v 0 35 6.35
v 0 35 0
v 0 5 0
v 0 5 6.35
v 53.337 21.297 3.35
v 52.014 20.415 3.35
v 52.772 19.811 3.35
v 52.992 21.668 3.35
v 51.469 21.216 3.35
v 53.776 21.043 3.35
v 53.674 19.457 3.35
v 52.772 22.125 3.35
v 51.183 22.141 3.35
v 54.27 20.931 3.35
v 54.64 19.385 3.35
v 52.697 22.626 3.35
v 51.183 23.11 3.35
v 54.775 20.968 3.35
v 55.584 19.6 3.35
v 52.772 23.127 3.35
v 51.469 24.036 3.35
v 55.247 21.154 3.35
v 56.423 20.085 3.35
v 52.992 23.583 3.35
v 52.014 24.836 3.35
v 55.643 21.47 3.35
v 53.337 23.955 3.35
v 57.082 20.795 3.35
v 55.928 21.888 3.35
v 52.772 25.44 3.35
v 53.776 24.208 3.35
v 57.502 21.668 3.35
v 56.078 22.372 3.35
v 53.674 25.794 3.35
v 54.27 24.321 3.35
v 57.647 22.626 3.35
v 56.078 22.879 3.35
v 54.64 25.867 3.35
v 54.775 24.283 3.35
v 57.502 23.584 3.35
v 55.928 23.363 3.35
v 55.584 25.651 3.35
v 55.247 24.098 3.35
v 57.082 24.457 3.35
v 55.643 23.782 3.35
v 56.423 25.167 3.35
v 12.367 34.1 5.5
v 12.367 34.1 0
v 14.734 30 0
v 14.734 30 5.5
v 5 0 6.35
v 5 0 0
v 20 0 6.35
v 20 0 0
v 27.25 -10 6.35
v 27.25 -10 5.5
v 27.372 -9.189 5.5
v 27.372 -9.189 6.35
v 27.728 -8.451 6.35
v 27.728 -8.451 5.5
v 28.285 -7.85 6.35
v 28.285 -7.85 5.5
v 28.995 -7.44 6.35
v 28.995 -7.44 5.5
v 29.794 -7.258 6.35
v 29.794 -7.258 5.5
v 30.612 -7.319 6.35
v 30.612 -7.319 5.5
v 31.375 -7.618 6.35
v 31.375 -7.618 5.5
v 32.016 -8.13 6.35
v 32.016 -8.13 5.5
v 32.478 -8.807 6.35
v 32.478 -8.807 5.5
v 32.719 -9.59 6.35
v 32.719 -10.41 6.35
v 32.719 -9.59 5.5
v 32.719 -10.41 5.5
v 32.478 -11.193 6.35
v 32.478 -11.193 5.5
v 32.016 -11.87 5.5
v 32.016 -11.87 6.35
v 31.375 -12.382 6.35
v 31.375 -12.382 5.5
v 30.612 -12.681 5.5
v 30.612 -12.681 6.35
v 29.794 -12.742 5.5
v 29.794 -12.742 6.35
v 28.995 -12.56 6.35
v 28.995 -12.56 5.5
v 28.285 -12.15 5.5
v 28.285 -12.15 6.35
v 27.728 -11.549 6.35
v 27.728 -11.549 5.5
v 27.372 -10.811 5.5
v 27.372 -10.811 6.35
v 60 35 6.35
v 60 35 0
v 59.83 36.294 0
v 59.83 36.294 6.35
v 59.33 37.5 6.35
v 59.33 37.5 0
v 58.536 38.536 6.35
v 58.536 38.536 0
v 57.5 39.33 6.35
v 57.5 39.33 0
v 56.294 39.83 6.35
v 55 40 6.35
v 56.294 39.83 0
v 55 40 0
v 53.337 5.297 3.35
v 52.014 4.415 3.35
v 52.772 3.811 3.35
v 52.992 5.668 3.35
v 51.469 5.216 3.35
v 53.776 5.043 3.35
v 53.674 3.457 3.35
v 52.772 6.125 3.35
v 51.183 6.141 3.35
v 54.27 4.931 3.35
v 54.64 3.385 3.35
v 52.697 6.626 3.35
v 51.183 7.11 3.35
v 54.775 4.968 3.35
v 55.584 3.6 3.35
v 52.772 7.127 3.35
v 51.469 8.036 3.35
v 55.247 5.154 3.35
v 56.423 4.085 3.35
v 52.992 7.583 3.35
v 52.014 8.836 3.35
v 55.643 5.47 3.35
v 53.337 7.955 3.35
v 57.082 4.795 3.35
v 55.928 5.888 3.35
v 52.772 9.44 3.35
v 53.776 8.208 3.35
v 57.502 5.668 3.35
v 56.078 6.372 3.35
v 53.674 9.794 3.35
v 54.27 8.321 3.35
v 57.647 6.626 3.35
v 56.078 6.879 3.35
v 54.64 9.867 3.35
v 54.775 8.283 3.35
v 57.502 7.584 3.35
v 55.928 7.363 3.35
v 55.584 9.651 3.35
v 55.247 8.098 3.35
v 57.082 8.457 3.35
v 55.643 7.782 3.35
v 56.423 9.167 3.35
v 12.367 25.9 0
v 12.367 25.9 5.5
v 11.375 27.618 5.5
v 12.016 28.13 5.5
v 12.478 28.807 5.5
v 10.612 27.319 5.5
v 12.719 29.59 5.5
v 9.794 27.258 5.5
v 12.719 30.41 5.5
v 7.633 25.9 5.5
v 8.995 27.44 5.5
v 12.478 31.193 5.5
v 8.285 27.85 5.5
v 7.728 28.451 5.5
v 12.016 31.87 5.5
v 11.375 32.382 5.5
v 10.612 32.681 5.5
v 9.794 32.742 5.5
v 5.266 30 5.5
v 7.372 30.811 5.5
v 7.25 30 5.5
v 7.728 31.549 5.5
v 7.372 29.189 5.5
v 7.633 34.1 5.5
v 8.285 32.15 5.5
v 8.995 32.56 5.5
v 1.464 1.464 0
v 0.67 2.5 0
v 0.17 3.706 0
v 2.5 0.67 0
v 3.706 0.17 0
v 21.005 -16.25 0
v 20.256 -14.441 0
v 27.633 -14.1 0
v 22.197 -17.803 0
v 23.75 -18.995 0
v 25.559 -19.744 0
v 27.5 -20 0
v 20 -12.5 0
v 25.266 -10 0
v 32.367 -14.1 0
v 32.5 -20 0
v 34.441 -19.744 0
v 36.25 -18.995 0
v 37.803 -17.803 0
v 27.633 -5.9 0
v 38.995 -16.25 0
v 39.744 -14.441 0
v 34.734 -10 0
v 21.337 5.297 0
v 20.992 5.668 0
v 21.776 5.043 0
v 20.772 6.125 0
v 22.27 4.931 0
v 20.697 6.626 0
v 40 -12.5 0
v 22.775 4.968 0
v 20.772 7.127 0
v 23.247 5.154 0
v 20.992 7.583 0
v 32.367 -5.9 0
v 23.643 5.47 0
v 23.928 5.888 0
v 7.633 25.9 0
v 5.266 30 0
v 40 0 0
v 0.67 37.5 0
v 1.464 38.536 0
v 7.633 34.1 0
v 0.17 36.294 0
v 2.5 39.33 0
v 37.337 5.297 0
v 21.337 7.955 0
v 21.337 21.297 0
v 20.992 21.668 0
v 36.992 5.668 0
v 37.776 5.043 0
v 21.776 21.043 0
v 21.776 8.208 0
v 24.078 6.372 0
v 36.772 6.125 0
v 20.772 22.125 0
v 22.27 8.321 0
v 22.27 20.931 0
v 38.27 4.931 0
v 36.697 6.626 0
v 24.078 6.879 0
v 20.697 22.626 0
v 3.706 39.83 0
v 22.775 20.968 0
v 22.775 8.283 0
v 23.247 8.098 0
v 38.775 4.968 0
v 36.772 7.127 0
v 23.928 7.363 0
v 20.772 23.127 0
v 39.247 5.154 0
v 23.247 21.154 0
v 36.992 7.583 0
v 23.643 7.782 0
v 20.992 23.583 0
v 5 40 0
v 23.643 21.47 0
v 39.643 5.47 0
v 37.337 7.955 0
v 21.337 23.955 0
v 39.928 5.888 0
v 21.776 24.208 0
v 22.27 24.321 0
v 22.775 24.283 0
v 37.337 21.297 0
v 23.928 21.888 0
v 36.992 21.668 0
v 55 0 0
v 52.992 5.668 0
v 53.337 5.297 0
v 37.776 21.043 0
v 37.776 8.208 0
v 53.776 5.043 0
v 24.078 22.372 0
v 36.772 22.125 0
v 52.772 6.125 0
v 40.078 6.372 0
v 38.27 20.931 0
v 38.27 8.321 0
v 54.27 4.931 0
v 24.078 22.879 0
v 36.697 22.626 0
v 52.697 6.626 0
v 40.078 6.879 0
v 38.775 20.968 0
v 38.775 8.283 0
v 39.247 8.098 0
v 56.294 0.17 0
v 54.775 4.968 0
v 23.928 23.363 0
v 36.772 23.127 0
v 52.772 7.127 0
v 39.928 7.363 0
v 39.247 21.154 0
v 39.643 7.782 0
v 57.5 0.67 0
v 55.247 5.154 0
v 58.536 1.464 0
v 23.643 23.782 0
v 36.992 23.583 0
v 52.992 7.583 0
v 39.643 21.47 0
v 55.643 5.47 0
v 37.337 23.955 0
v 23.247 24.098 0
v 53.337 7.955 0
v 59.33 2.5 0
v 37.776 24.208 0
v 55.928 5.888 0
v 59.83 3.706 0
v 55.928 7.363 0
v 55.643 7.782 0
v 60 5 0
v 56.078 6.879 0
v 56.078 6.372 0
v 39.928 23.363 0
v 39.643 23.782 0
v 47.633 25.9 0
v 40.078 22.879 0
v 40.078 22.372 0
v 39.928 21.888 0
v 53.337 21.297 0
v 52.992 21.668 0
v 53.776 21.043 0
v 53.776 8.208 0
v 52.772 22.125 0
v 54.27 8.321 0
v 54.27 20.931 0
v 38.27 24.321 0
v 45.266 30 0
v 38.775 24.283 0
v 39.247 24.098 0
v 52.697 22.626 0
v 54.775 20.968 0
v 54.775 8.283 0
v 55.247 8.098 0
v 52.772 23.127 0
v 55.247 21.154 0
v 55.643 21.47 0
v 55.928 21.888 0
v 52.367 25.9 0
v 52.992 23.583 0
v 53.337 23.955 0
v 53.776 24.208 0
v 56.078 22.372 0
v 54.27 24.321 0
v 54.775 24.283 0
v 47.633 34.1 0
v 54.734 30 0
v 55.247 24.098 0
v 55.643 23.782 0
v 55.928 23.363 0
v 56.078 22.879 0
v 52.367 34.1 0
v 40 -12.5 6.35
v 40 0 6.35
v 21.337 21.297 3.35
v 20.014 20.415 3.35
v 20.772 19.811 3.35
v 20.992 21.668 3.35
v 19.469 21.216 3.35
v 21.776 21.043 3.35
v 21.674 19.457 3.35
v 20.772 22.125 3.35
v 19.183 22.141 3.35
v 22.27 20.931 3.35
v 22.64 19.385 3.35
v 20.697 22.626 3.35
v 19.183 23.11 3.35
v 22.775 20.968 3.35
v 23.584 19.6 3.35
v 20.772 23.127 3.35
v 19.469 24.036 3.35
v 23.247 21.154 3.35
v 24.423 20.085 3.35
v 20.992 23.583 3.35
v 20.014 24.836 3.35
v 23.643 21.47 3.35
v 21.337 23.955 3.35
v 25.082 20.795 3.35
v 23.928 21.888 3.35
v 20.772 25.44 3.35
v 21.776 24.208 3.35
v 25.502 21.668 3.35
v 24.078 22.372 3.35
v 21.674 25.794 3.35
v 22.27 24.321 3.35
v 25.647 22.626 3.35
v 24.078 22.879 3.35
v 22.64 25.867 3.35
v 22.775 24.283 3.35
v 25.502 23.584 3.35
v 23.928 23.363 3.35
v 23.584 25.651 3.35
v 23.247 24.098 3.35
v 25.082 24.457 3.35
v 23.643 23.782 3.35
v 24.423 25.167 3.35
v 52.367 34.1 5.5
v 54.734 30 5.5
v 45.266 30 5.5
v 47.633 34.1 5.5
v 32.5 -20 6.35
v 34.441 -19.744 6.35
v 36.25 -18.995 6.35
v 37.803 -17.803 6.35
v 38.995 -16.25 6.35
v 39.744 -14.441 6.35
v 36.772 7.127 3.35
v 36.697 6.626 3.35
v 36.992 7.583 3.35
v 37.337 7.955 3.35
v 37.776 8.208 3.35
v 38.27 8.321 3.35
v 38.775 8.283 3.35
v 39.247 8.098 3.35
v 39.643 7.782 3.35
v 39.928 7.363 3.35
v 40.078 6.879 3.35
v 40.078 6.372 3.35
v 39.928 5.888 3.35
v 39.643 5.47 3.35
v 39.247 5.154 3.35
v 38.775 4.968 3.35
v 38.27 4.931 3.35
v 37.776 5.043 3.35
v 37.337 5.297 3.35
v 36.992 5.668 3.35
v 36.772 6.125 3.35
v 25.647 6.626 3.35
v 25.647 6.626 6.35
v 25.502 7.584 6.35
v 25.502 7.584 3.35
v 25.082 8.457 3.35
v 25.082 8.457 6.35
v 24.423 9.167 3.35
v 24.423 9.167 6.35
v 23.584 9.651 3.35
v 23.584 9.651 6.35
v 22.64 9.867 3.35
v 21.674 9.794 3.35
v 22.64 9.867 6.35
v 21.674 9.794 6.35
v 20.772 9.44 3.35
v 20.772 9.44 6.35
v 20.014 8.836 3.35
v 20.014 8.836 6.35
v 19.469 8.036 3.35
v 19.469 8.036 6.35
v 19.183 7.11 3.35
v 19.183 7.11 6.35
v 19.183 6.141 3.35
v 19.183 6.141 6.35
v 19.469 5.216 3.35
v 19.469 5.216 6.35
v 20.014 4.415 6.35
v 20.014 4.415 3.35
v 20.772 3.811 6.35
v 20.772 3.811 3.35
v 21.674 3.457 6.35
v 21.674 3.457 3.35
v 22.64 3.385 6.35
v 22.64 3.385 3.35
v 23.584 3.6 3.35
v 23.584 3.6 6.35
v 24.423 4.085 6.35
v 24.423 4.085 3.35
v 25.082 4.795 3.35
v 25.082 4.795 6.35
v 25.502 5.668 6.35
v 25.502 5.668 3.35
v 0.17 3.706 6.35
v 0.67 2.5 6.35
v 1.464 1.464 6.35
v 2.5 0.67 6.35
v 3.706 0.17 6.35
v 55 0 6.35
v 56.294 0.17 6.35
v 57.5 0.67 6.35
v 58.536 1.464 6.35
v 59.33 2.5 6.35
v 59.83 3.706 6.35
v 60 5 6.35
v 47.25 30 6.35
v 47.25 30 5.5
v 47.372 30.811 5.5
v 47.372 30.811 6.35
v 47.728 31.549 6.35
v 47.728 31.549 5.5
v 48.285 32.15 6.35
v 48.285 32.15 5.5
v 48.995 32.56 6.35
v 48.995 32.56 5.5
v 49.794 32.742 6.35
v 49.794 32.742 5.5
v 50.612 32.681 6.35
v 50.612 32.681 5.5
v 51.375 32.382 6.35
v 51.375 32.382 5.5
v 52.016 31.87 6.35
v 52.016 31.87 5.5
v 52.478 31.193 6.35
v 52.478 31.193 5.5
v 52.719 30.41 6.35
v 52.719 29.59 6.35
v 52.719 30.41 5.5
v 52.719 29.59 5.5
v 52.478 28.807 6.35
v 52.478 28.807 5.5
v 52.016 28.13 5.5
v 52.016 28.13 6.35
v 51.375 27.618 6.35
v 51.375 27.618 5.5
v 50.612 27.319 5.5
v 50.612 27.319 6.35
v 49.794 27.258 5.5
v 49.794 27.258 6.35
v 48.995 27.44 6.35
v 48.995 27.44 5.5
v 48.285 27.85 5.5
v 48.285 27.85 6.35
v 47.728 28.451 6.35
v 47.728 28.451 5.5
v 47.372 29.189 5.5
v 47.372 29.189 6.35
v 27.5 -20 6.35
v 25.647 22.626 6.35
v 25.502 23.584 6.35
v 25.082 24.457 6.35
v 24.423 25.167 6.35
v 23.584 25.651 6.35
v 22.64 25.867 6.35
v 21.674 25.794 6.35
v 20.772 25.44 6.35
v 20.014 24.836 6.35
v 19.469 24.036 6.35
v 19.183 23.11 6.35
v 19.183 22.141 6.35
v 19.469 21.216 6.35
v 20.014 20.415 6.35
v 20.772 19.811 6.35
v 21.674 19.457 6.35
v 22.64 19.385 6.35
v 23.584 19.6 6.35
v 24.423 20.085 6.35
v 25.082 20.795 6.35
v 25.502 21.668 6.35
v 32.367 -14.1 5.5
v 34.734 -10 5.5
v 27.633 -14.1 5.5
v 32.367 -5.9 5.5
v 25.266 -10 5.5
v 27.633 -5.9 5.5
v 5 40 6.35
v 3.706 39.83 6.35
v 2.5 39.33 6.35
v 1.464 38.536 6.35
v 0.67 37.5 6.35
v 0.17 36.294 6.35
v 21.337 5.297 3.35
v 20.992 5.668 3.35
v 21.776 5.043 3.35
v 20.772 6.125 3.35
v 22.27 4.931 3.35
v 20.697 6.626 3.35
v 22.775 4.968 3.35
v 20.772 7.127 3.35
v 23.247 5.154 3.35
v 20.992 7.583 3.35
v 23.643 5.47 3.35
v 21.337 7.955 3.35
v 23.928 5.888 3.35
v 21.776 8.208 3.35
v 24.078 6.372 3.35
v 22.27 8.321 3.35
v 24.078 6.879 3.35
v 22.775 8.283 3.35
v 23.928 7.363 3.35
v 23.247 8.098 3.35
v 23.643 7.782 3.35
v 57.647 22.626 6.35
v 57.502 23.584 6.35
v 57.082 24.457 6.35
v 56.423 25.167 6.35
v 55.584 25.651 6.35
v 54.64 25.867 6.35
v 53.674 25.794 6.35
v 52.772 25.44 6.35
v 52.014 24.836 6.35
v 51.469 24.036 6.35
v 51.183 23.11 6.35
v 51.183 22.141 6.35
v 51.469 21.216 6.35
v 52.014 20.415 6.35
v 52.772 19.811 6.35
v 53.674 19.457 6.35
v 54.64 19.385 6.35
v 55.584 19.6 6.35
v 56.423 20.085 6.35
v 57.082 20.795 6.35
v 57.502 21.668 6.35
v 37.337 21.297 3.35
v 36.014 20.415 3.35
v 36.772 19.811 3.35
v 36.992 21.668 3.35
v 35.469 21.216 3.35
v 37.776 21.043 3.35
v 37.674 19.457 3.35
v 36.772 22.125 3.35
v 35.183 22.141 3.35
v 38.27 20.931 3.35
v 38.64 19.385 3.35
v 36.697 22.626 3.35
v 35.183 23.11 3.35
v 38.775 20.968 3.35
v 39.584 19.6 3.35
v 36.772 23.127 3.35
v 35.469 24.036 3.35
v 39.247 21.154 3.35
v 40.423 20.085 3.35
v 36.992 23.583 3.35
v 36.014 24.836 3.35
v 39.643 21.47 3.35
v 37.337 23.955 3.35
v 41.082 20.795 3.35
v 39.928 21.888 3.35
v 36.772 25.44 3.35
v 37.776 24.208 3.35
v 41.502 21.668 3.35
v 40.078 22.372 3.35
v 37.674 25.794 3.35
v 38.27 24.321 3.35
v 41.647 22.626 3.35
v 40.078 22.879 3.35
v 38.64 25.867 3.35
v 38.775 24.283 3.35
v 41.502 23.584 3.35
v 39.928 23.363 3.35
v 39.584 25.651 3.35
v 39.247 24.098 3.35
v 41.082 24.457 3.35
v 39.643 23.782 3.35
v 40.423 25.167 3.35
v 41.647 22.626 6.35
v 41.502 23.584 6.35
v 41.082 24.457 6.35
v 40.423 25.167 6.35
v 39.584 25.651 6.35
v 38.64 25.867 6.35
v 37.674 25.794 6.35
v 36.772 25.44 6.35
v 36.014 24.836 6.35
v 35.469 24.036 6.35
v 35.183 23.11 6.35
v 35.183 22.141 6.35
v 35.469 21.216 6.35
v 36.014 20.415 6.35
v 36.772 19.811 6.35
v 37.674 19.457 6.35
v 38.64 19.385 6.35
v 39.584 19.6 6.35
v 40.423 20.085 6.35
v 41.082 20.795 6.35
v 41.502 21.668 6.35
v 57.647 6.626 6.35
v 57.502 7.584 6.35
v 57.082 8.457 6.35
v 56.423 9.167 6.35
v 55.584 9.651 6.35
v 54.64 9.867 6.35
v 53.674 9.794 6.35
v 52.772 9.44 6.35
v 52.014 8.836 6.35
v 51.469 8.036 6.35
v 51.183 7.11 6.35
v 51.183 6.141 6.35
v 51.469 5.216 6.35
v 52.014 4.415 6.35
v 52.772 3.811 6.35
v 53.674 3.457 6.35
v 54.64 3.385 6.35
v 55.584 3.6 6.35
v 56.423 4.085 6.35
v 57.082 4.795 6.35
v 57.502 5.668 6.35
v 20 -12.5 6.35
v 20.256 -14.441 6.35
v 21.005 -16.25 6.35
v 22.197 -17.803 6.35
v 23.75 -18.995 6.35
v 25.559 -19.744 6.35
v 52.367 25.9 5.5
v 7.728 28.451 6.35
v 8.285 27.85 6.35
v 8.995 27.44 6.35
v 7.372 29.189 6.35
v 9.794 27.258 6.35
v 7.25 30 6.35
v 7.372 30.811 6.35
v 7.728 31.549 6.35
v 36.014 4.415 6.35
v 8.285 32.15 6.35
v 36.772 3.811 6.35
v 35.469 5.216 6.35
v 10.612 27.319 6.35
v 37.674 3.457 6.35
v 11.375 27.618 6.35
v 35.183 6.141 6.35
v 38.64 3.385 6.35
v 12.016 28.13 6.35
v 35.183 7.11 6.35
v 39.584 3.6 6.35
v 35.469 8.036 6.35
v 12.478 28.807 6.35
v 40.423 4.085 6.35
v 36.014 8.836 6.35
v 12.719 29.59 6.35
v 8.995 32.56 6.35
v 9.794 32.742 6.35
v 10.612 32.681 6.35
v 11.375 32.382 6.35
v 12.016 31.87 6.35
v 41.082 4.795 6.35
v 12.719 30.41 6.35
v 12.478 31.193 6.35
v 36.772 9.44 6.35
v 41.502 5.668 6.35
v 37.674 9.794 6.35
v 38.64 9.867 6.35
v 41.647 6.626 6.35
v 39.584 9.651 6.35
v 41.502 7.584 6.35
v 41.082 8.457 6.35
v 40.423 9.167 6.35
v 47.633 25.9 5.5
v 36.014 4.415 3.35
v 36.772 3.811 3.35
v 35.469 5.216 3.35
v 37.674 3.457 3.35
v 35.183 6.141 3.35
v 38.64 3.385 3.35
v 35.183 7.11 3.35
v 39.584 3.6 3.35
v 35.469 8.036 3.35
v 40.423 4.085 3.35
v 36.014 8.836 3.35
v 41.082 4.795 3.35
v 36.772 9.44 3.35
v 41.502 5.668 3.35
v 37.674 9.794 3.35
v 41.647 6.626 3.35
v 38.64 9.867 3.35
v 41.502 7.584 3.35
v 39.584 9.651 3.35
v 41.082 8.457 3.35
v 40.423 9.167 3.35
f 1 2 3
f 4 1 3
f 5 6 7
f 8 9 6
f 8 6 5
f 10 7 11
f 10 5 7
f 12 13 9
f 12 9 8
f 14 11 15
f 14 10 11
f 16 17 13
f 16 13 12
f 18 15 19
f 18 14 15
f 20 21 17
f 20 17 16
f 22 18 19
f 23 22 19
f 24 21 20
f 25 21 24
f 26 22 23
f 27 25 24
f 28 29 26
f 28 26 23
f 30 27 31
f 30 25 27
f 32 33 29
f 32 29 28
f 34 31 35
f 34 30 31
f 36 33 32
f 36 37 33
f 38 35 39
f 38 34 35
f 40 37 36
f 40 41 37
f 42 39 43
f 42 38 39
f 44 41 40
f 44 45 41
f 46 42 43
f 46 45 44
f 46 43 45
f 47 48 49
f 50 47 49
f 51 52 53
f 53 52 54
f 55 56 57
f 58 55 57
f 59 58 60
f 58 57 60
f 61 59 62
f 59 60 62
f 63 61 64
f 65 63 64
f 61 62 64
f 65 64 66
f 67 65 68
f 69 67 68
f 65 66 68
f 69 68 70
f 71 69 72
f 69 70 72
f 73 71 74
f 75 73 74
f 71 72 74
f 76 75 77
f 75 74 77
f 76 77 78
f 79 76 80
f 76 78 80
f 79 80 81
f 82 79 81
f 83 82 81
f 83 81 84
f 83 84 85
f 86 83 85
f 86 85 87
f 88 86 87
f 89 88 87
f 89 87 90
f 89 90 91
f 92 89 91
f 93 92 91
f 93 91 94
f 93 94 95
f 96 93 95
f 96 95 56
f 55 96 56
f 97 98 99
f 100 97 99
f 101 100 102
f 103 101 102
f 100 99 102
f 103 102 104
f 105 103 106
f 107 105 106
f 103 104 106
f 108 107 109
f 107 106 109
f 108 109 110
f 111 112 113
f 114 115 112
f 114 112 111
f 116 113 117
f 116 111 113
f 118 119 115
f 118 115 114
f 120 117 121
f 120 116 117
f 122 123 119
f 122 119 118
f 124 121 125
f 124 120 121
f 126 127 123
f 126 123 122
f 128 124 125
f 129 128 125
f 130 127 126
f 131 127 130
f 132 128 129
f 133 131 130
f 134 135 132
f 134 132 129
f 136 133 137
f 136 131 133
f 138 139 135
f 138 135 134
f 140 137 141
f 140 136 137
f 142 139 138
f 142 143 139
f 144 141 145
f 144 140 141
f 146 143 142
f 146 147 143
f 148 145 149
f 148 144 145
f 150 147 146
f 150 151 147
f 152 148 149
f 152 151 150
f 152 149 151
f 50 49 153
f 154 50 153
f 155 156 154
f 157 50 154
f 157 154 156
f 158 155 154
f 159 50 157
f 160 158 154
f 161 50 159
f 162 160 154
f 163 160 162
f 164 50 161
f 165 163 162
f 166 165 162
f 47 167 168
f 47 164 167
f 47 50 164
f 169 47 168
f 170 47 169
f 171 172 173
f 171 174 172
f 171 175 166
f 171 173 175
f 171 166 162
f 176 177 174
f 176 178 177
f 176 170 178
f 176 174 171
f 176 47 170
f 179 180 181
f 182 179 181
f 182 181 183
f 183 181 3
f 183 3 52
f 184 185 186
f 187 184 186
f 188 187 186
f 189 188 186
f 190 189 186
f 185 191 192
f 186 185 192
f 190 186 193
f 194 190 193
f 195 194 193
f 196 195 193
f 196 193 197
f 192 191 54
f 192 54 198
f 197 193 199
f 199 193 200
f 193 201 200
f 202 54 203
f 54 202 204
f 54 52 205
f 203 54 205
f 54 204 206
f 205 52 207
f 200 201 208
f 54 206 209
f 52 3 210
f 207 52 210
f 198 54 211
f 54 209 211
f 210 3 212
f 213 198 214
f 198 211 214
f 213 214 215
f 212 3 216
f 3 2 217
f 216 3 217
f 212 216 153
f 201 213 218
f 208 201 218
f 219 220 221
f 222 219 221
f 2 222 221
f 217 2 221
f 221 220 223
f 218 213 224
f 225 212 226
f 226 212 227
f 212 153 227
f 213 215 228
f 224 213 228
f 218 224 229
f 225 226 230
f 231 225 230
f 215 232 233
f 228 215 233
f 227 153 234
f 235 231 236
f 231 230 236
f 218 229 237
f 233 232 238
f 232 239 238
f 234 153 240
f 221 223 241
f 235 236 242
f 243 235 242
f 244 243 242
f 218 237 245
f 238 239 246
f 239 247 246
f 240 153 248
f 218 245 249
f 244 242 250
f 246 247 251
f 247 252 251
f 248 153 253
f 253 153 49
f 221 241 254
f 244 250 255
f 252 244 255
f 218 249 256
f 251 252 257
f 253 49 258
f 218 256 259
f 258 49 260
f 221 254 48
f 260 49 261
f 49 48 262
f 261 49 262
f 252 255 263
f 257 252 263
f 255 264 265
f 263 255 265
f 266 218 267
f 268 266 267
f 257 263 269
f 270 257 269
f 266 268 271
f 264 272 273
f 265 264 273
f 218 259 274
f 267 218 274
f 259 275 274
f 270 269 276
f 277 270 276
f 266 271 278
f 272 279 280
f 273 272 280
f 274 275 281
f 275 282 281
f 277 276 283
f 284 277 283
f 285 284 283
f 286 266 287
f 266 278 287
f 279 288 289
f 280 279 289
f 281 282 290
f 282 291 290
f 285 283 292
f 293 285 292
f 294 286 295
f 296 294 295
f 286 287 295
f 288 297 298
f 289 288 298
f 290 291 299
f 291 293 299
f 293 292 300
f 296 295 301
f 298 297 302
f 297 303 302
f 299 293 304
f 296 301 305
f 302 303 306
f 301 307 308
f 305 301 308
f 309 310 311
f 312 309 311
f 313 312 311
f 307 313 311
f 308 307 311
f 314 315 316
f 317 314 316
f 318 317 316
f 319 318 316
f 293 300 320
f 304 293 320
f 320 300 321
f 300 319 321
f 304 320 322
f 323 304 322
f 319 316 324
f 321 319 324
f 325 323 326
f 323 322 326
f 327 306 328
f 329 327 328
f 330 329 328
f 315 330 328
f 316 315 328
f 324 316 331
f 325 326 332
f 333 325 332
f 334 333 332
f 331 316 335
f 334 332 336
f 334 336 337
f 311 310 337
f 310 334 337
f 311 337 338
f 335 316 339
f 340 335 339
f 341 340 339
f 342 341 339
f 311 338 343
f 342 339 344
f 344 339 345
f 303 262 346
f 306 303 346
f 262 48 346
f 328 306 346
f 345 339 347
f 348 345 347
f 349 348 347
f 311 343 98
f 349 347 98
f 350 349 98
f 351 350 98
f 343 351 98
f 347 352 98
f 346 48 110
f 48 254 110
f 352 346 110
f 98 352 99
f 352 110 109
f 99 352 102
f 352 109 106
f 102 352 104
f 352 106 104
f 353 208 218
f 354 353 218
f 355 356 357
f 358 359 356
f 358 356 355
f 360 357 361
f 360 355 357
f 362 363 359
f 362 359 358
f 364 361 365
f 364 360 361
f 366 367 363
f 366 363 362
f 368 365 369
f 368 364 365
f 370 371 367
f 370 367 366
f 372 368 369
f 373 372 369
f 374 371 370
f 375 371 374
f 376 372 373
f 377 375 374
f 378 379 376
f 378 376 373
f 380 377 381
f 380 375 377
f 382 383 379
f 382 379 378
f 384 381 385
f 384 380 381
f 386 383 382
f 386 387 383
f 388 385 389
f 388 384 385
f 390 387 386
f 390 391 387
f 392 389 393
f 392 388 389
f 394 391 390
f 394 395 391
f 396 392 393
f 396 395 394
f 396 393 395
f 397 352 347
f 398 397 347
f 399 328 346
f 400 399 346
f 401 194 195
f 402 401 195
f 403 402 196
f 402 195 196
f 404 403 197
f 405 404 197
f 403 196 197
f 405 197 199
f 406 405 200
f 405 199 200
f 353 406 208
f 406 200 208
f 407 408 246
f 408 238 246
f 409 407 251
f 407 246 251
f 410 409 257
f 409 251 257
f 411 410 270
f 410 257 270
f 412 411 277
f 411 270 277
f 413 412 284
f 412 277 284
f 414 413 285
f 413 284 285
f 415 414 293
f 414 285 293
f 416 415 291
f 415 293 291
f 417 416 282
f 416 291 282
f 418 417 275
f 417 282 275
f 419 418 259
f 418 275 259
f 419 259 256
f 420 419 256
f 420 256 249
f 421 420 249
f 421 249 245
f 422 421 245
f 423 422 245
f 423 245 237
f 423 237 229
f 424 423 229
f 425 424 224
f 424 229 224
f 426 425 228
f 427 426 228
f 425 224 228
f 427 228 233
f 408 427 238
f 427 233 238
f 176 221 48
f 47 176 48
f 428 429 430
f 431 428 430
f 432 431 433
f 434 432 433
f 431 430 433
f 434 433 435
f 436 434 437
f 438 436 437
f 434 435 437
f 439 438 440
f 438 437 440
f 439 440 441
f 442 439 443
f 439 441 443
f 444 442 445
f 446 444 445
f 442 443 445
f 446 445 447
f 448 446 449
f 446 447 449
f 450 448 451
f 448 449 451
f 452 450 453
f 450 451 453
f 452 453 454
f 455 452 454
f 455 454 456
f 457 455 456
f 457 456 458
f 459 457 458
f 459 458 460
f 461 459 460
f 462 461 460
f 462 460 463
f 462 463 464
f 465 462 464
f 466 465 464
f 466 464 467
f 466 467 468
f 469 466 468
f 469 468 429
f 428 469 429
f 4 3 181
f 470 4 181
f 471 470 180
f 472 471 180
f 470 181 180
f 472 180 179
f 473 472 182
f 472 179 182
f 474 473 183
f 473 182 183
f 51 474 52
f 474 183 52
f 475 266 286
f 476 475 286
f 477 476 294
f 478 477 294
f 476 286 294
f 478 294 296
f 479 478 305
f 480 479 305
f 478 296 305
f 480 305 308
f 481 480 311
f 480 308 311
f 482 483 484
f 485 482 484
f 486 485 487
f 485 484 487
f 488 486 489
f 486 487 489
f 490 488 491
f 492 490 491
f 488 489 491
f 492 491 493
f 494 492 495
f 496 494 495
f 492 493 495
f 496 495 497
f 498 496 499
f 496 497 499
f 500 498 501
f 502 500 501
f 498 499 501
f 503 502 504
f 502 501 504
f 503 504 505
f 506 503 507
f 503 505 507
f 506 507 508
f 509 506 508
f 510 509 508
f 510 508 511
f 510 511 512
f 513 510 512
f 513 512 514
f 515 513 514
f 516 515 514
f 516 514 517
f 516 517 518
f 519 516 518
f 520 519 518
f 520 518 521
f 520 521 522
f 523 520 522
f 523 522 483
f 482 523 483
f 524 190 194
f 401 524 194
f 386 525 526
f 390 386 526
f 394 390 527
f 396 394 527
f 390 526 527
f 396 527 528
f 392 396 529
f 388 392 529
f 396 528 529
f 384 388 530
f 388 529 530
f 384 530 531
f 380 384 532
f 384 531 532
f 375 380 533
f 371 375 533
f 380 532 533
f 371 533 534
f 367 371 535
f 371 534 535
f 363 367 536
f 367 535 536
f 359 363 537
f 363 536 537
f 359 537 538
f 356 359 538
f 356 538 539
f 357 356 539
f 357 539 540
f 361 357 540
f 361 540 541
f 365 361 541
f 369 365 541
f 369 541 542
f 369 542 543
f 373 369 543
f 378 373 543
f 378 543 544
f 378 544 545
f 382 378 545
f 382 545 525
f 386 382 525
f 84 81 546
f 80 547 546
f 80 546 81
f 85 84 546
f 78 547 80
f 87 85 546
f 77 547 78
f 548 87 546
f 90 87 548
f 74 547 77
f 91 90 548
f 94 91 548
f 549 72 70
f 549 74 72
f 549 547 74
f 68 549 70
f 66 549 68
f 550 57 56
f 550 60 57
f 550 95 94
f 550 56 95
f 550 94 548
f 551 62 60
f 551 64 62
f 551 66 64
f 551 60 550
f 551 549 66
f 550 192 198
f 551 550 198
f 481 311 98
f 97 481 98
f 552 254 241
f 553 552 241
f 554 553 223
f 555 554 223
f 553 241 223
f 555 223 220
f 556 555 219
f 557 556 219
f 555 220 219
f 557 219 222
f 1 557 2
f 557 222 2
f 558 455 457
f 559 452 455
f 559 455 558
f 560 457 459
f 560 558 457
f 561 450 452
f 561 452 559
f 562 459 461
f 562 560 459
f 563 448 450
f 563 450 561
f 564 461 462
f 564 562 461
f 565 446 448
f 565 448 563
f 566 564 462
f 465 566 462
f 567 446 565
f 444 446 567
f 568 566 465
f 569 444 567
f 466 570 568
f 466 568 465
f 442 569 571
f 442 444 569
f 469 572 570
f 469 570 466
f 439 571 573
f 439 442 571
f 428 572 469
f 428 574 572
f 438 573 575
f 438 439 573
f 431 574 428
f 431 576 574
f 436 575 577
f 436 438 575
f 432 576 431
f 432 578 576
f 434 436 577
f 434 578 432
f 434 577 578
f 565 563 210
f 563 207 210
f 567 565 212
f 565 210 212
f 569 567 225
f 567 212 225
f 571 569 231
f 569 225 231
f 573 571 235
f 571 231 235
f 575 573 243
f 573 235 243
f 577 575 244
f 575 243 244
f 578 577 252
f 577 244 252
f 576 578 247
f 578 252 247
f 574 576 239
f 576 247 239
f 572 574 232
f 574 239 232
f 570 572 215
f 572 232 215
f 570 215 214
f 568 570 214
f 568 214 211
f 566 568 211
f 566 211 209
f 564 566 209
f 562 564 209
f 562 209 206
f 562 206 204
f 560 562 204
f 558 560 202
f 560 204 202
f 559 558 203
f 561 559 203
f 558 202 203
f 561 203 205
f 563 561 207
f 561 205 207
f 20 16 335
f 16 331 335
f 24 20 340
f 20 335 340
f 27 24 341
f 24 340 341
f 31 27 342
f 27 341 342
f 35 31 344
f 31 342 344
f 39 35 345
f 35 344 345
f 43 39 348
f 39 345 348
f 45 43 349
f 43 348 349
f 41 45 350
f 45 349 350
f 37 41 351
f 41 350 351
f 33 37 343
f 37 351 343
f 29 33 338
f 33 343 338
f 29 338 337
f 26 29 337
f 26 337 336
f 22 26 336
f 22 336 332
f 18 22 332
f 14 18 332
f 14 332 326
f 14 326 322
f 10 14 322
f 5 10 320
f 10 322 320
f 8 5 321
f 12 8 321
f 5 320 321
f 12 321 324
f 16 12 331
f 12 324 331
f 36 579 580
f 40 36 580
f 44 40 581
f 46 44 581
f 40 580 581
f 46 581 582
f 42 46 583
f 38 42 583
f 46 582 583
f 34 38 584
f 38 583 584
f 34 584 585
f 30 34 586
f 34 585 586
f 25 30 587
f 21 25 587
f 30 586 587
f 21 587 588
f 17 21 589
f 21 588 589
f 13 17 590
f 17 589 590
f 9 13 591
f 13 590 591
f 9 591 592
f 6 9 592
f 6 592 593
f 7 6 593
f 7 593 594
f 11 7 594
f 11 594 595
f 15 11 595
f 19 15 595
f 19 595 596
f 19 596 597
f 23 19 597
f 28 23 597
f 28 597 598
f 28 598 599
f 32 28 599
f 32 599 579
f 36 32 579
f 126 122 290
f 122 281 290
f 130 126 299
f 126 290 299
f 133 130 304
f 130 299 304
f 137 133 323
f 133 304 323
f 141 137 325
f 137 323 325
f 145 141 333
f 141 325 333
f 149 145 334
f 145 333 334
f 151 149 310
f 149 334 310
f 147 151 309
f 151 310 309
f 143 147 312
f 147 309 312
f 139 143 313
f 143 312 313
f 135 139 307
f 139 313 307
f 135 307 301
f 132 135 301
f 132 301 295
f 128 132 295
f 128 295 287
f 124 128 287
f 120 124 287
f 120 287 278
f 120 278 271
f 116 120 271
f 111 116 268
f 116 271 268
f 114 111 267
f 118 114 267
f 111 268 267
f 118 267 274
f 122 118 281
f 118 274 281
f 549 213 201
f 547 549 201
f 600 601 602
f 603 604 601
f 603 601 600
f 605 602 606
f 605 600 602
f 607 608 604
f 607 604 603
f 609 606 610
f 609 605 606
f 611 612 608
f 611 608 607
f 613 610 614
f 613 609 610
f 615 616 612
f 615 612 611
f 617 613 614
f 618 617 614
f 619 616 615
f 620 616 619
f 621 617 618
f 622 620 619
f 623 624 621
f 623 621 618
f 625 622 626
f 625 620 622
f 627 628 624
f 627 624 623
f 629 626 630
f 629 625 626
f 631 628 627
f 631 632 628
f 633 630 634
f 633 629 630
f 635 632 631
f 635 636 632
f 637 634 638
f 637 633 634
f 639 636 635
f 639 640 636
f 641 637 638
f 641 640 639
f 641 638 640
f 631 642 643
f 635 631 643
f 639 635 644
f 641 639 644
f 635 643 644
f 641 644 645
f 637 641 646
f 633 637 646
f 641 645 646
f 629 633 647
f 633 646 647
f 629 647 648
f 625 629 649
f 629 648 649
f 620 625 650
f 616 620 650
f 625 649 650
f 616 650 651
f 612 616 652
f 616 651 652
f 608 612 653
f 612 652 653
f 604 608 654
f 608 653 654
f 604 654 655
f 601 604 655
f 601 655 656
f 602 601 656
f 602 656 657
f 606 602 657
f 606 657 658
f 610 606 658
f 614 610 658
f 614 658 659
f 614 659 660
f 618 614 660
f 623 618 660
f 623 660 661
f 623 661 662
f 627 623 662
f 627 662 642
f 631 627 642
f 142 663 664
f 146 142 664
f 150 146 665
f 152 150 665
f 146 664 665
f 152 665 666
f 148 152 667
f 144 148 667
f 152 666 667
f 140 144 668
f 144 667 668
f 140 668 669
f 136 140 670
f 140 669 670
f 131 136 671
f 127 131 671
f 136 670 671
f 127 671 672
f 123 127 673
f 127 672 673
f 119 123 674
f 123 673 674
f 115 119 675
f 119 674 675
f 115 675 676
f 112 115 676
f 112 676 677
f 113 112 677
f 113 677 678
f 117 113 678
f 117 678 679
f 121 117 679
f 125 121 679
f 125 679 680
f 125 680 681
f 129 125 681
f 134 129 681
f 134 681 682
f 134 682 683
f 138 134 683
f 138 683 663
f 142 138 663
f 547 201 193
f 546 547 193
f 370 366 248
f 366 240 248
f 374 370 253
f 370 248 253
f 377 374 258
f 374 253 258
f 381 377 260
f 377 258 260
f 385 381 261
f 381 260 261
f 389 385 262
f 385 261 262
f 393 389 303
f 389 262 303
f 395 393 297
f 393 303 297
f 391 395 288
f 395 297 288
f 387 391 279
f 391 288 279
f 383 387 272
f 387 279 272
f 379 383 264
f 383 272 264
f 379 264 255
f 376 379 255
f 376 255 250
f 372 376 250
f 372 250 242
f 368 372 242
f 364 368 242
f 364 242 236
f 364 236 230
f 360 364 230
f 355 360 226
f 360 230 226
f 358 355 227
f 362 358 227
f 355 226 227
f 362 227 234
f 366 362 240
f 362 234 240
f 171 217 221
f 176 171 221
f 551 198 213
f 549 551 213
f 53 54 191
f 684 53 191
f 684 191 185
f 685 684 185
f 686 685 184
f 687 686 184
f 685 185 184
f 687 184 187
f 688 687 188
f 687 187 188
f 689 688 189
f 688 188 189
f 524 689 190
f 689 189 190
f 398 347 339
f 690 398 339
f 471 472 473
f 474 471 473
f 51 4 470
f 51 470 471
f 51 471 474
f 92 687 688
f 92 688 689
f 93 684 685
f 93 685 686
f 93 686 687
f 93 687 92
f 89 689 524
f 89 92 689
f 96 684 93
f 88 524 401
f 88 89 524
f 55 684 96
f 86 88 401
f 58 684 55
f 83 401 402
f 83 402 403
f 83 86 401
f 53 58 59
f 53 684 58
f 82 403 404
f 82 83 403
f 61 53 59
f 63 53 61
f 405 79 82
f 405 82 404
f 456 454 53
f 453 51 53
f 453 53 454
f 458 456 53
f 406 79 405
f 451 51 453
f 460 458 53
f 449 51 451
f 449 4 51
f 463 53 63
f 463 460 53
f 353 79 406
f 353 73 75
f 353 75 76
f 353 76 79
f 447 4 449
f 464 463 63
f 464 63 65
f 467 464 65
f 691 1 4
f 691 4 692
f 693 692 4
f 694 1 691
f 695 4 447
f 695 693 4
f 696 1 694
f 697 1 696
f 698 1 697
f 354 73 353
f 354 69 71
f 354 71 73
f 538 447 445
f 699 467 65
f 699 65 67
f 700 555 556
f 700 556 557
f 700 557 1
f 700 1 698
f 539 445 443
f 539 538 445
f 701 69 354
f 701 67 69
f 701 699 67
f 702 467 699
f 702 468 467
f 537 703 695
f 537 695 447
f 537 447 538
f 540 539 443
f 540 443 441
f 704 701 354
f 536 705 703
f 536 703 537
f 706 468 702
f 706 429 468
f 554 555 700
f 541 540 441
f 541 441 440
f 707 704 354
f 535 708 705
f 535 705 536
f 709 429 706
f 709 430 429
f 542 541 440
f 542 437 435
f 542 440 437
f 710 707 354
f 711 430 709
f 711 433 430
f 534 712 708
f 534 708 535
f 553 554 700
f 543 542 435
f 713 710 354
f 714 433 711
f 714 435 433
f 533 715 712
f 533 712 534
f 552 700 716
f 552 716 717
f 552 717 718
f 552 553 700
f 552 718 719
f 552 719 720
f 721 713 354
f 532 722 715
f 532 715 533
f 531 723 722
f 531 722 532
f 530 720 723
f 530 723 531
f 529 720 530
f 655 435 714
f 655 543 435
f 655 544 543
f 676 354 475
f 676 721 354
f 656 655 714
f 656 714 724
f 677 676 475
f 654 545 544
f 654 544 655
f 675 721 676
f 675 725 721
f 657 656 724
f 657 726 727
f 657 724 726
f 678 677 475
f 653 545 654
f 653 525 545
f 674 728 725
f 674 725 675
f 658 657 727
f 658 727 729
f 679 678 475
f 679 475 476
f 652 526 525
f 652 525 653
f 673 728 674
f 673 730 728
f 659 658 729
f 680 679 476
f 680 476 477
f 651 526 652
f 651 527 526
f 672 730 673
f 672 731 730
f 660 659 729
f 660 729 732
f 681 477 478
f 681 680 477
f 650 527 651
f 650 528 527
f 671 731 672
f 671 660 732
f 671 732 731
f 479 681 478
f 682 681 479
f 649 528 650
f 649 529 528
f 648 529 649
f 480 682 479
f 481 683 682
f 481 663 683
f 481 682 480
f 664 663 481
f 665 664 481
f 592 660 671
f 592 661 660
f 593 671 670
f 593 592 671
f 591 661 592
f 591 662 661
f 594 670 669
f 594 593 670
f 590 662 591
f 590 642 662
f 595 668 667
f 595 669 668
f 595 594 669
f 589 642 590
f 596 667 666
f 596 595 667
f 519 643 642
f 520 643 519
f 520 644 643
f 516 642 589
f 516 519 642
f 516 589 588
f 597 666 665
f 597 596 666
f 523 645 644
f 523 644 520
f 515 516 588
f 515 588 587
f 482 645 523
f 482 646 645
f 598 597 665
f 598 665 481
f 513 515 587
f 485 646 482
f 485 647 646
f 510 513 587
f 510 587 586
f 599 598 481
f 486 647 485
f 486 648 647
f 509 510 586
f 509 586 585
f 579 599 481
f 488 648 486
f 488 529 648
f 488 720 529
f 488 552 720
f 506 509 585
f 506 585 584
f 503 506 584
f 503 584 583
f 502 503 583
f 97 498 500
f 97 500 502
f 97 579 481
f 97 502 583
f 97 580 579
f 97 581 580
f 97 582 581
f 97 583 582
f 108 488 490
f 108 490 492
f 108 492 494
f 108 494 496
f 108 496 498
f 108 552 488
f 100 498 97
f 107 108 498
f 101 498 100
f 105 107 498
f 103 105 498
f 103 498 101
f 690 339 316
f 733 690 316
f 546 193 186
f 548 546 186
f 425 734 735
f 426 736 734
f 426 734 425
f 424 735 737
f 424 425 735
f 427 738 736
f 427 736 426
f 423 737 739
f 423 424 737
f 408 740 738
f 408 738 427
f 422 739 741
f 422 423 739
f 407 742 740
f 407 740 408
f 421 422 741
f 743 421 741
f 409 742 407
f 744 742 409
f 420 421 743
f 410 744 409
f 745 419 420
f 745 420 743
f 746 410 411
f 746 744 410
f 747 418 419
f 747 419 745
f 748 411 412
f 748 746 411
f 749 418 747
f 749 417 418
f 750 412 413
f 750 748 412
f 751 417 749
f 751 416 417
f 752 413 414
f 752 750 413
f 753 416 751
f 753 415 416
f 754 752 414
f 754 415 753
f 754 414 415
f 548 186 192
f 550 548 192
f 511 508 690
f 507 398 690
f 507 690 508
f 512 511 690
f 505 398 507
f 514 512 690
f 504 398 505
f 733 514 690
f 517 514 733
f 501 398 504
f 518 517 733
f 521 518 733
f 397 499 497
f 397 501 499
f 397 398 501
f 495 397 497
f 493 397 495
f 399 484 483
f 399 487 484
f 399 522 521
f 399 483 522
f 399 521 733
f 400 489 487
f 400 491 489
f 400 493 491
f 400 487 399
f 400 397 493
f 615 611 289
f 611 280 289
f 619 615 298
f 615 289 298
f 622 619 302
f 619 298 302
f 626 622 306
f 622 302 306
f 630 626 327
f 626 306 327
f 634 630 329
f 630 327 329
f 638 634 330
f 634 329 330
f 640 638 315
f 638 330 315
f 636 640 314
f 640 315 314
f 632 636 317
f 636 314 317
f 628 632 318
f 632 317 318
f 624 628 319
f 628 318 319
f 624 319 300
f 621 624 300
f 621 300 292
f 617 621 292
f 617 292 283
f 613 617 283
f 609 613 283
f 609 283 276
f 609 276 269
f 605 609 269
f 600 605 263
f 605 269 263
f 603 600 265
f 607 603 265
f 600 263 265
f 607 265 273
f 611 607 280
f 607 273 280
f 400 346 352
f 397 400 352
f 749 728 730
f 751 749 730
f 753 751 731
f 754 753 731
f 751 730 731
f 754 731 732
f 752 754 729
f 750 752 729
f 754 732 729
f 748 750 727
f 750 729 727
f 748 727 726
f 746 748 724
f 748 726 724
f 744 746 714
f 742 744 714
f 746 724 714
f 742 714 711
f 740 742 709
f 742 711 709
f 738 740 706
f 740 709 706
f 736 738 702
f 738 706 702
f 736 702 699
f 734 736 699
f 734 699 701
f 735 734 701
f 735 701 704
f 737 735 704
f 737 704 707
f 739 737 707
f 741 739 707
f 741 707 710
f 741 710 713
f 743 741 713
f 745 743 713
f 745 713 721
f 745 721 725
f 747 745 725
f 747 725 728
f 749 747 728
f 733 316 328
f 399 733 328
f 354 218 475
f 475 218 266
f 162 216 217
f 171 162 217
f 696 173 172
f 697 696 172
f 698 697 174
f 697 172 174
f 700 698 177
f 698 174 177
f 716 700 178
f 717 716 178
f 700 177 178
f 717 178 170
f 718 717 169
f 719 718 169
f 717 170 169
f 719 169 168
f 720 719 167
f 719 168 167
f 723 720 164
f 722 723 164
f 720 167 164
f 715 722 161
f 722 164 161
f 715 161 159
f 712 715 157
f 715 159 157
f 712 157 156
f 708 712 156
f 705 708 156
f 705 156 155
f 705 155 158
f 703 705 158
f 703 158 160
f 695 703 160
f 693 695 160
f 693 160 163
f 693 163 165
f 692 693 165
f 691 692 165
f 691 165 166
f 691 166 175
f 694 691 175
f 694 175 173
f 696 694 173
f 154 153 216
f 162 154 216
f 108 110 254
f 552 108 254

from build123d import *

# Parameters (mm, degrees)
BOSS_EXTRUDE1_DEPTH            = 6.35
M5_CLEARANCE_HOLE1_D           = 5.5
CBORE_FOR_M3_SHCS1_D           = 3.4
CBORE_FOR_M3_SHCS1_CBORE_D     = 6.5
CBORE_FOR_M3_SHCS1_CBORE_DEPTH = 3
CUT_EXTRUDE1_DEPTH             = 5.5


with BuildPart() as part:
    # Sketch1 → Boss-Extrude1 (new body)
    with BuildSketch(Plane.XY):
        with BuildLine():
            Line((5, 0), (20, 0))
            Line((20, 0), (20, -12.5))
            ThreePointArc((20, -12.5), (22.196699141, -17.803300859), (27.5, -20))
            Line((27.5, -20), (32.5, -20))
            ThreePointArc((32.5, -20), (37.803300859, -17.803300859), (40, -12.5))
            Line((40, -12.5), (40, 0))
            Line((40, 0), (55, 0))
            ThreePointArc((55, 0), (58.535533906, 1.464466094), (60, 5))
            Line((60, 5), (60, 35))
            ThreePointArc((60, 35), (58.535533906, 38.535533906), (55, 40))
            Line((55, 40), (5, 40))
            ThreePointArc((5, 40), (1.464466094, 38.535533906), (0, 35))
            Line((0, 35), (0, 5))
            ThreePointArc((0, 5), (1.464466094, 1.464466094), (5, 0))
        make_face()
    extrude(amount=BOSS_EXTRUDE1_DEPTH)

    # M5 Clearance Hole1 (through all)
    with Locations(Plane.XY.offset(6.35)):
        with Locations((30, -10), (10, 30), (50, 30)):
            Hole(M5_CLEARANCE_HOLE1_D / 2)

    # CBORE for M3 SHCS1 (through all)
    with Locations(Plane.XY.offset(6.35)):
        with Locations((38.396727498, 22.625800799), (54.396727498, 6.625800799), (38.396727498, 6.625800799), (54.396727498, 22.625800799), (22.396727498, 6.625800799), (22.396727498, 22.625800799)):
            CounterBoreHole(CBORE_FOR_M3_SHCS1_D / 2, CBORE_FOR_M3_SHCS1_CBORE_D / 2, CBORE_FOR_M3_SHCS1_CBORE_DEPTH)

    # Sketch7 → Cut-Extrude1 (cut)
    with BuildSketch(Plane(origin=(0, 0, 0), x_dir=(-1, 0, 0), z_dir=(0, 0, -1))):
        Polygon((-45.265727793, 30), (-47.632863896, 34.1), (-52.367136104, 34.1), (-54.734272207, 30), (-52.367136104, 25.9), (-47.632863896, 25.9), align=None)
        Polygon((-5.265727793, 30), (-7.632863896, 34.1), (-12.367136104, 34.1), (-14.734272207, 30), (-12.367136104, 25.9), (-7.632863896, 25.9), align=None)
        Polygon((-25.265727793, -10), (-27.632863896, -5.9), (-32.367136104, -5.9), (-34.734272207, -10), (-32.367136104, -14.1), (-27.632863896, -14.1), align=None)
    extrude(amount=-CUT_EXTRUDE1_DEPTH, mode=Mode.SUBTRACT)


solid = part.part
